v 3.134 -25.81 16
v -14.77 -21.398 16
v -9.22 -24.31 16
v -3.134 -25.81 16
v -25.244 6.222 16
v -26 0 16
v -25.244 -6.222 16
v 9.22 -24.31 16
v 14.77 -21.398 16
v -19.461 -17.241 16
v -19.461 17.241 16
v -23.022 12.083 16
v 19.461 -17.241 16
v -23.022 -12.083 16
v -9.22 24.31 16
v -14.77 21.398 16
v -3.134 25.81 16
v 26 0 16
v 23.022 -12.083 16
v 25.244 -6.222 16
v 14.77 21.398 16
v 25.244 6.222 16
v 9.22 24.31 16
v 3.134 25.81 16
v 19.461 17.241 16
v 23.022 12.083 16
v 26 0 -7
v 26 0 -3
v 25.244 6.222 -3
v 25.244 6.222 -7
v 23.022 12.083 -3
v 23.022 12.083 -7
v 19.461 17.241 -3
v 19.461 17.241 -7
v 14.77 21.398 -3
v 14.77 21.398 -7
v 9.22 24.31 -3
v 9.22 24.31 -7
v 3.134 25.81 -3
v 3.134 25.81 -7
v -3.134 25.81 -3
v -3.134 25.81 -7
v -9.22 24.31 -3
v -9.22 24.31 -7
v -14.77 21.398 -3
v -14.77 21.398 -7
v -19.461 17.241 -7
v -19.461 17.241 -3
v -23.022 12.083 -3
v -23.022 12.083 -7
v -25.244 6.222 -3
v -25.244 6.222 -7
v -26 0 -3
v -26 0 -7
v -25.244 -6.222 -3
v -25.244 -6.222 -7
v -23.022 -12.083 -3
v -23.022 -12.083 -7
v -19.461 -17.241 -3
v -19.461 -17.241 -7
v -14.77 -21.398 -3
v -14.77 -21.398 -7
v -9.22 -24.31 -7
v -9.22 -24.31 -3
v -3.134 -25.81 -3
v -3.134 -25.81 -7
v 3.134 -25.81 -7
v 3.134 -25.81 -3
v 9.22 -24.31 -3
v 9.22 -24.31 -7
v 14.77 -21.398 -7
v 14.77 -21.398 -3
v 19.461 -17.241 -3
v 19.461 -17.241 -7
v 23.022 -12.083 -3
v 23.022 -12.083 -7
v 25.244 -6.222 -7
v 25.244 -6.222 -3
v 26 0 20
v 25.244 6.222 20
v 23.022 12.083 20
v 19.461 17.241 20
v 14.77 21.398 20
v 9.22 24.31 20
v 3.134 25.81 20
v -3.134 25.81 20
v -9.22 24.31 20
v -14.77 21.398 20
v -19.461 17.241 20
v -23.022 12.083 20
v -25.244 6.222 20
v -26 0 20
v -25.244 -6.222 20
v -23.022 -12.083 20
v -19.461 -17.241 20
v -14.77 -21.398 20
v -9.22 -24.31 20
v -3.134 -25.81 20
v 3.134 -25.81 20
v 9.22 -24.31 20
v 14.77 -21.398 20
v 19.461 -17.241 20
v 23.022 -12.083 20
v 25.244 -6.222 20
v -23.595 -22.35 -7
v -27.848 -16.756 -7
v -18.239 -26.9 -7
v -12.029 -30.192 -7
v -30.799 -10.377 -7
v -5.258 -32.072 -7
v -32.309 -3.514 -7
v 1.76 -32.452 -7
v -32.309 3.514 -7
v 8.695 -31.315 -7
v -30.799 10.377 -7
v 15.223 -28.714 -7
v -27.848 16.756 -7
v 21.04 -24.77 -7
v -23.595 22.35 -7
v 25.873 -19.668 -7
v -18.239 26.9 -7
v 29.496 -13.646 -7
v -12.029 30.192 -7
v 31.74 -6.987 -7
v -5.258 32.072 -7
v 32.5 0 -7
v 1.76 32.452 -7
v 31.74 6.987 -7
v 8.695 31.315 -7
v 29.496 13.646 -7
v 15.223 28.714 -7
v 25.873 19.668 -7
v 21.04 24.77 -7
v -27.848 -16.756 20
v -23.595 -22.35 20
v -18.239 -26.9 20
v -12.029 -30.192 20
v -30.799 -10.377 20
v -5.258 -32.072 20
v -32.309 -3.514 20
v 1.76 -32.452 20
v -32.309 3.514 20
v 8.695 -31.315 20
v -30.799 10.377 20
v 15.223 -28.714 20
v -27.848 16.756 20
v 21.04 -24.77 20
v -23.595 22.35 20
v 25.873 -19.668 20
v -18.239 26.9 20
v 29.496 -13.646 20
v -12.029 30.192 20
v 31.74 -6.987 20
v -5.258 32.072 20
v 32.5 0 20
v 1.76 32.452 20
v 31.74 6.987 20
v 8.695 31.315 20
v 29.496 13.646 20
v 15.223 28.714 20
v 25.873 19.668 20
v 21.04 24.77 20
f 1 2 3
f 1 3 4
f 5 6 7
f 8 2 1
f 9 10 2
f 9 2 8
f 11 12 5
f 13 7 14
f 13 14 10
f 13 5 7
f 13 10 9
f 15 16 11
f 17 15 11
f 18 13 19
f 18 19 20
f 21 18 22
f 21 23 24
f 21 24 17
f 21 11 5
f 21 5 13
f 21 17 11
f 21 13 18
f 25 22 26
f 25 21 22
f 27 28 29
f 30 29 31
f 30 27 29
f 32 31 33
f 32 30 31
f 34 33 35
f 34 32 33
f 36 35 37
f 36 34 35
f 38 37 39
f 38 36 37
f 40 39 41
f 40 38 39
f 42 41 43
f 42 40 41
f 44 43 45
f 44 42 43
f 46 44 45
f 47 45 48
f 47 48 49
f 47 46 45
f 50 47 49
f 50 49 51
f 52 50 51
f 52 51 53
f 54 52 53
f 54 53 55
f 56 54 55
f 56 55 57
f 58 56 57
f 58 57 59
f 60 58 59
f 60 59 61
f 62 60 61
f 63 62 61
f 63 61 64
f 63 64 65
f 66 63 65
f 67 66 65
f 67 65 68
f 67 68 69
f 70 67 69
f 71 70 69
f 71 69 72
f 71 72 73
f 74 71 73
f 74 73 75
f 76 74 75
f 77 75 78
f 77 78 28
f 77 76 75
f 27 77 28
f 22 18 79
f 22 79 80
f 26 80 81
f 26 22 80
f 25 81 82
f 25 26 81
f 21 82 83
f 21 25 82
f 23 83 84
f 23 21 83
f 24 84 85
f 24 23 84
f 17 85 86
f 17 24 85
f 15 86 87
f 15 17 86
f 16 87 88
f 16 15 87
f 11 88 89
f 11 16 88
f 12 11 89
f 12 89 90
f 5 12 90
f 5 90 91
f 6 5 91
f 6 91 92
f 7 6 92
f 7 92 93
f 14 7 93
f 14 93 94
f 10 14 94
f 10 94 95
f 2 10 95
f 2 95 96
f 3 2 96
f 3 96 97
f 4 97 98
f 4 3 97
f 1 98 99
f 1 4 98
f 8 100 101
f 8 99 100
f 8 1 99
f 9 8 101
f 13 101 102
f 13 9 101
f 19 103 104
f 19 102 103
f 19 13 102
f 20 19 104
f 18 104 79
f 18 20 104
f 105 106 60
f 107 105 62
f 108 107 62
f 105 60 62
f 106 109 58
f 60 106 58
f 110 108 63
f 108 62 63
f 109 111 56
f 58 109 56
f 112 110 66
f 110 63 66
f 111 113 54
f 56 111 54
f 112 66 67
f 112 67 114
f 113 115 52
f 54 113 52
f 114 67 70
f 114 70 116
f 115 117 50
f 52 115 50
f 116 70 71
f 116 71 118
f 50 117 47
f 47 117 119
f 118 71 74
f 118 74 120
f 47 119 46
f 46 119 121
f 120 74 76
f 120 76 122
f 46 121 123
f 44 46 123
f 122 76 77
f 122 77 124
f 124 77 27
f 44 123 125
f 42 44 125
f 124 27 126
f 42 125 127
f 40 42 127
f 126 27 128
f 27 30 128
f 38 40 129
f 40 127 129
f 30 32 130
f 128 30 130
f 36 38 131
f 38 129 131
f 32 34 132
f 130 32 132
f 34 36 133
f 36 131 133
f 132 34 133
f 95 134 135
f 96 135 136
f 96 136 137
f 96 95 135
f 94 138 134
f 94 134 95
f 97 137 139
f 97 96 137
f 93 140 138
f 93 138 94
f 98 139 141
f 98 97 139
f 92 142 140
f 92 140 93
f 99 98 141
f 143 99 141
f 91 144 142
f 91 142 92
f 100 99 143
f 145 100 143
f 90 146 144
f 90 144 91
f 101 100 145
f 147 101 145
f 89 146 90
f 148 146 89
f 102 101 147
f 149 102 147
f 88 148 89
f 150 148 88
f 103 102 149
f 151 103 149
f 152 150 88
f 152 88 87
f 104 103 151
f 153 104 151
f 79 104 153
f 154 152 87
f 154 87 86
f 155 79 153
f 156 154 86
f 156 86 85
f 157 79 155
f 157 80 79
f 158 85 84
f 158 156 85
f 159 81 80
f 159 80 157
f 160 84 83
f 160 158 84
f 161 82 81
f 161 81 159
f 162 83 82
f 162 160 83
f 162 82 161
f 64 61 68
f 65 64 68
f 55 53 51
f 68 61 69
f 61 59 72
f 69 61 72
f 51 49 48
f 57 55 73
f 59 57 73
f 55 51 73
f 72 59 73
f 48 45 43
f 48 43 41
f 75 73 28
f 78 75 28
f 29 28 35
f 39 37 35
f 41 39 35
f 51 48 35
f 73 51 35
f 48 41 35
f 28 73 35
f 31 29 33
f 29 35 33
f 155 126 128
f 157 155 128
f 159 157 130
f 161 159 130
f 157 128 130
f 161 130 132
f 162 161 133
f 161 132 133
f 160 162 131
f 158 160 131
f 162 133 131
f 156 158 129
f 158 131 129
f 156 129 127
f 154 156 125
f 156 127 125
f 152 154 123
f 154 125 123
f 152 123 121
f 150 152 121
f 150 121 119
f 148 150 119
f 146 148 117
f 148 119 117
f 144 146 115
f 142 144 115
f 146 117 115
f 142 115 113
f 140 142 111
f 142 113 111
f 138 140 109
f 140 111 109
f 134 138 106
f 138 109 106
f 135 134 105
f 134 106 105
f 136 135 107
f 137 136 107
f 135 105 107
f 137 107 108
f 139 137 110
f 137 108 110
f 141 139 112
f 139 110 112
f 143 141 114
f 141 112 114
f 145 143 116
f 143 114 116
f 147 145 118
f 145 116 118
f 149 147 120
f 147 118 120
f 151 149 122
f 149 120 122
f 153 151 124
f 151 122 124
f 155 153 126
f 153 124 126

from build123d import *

# Parameters (mm, degrees)
EXTRUDE_1_DEPTH          = 20
EXTRUDE_1_DEPTH_BACK     = 7
SKETCH_1_R               = 32.5
CUT_EXTRUDE_6_DEPTH      = 55
CUT_EXTRUDE_6_DEPTH_BACK = 81
SKETCH_2_R               = 26
EXTRUDE_4_DEPTH          = 16
EXTRUDE_4_DEPTH_BACK     = 3
SKETCH_3_R               = 26


with BuildPart() as part:
    # 草图1 → 凸台-拉伸1 (new, two sides: drawn at the far end of the back side and taken through both)
    with BuildSketch(Plane.XY.offset(-EXTRUDE_1_DEPTH_BACK)):
        Circle(SKETCH_1_R)
    extrude(amount=EXTRUDE_1_DEPTH + EXTRUDE_1_DEPTH_BACK)

    # 草图2 → 切除-拉伸6 (cut, two sides: drawn at the far end of the back side and taken through both)
    with BuildSketch(Plane.XY.offset(-CUT_EXTRUDE_6_DEPTH_BACK)):
        Circle(SKETCH_2_R)
    extrude(amount=CUT_EXTRUDE_6_DEPTH + CUT_EXTRUDE_6_DEPTH_BACK, mode=Mode.SUBTRACT)

    # 草图3 → 凸台-拉伸4 (add, two sides: drawn at the far end of the back side and taken through both)
    with BuildSketch(Plane.XY.offset(-EXTRUDE_4_DEPTH_BACK)):
        Circle(SKETCH_3_R)
    extrude(amount=EXTRUDE_4_DEPTH + EXTRUDE_4_DEPTH_BACK)


solid = part.part
